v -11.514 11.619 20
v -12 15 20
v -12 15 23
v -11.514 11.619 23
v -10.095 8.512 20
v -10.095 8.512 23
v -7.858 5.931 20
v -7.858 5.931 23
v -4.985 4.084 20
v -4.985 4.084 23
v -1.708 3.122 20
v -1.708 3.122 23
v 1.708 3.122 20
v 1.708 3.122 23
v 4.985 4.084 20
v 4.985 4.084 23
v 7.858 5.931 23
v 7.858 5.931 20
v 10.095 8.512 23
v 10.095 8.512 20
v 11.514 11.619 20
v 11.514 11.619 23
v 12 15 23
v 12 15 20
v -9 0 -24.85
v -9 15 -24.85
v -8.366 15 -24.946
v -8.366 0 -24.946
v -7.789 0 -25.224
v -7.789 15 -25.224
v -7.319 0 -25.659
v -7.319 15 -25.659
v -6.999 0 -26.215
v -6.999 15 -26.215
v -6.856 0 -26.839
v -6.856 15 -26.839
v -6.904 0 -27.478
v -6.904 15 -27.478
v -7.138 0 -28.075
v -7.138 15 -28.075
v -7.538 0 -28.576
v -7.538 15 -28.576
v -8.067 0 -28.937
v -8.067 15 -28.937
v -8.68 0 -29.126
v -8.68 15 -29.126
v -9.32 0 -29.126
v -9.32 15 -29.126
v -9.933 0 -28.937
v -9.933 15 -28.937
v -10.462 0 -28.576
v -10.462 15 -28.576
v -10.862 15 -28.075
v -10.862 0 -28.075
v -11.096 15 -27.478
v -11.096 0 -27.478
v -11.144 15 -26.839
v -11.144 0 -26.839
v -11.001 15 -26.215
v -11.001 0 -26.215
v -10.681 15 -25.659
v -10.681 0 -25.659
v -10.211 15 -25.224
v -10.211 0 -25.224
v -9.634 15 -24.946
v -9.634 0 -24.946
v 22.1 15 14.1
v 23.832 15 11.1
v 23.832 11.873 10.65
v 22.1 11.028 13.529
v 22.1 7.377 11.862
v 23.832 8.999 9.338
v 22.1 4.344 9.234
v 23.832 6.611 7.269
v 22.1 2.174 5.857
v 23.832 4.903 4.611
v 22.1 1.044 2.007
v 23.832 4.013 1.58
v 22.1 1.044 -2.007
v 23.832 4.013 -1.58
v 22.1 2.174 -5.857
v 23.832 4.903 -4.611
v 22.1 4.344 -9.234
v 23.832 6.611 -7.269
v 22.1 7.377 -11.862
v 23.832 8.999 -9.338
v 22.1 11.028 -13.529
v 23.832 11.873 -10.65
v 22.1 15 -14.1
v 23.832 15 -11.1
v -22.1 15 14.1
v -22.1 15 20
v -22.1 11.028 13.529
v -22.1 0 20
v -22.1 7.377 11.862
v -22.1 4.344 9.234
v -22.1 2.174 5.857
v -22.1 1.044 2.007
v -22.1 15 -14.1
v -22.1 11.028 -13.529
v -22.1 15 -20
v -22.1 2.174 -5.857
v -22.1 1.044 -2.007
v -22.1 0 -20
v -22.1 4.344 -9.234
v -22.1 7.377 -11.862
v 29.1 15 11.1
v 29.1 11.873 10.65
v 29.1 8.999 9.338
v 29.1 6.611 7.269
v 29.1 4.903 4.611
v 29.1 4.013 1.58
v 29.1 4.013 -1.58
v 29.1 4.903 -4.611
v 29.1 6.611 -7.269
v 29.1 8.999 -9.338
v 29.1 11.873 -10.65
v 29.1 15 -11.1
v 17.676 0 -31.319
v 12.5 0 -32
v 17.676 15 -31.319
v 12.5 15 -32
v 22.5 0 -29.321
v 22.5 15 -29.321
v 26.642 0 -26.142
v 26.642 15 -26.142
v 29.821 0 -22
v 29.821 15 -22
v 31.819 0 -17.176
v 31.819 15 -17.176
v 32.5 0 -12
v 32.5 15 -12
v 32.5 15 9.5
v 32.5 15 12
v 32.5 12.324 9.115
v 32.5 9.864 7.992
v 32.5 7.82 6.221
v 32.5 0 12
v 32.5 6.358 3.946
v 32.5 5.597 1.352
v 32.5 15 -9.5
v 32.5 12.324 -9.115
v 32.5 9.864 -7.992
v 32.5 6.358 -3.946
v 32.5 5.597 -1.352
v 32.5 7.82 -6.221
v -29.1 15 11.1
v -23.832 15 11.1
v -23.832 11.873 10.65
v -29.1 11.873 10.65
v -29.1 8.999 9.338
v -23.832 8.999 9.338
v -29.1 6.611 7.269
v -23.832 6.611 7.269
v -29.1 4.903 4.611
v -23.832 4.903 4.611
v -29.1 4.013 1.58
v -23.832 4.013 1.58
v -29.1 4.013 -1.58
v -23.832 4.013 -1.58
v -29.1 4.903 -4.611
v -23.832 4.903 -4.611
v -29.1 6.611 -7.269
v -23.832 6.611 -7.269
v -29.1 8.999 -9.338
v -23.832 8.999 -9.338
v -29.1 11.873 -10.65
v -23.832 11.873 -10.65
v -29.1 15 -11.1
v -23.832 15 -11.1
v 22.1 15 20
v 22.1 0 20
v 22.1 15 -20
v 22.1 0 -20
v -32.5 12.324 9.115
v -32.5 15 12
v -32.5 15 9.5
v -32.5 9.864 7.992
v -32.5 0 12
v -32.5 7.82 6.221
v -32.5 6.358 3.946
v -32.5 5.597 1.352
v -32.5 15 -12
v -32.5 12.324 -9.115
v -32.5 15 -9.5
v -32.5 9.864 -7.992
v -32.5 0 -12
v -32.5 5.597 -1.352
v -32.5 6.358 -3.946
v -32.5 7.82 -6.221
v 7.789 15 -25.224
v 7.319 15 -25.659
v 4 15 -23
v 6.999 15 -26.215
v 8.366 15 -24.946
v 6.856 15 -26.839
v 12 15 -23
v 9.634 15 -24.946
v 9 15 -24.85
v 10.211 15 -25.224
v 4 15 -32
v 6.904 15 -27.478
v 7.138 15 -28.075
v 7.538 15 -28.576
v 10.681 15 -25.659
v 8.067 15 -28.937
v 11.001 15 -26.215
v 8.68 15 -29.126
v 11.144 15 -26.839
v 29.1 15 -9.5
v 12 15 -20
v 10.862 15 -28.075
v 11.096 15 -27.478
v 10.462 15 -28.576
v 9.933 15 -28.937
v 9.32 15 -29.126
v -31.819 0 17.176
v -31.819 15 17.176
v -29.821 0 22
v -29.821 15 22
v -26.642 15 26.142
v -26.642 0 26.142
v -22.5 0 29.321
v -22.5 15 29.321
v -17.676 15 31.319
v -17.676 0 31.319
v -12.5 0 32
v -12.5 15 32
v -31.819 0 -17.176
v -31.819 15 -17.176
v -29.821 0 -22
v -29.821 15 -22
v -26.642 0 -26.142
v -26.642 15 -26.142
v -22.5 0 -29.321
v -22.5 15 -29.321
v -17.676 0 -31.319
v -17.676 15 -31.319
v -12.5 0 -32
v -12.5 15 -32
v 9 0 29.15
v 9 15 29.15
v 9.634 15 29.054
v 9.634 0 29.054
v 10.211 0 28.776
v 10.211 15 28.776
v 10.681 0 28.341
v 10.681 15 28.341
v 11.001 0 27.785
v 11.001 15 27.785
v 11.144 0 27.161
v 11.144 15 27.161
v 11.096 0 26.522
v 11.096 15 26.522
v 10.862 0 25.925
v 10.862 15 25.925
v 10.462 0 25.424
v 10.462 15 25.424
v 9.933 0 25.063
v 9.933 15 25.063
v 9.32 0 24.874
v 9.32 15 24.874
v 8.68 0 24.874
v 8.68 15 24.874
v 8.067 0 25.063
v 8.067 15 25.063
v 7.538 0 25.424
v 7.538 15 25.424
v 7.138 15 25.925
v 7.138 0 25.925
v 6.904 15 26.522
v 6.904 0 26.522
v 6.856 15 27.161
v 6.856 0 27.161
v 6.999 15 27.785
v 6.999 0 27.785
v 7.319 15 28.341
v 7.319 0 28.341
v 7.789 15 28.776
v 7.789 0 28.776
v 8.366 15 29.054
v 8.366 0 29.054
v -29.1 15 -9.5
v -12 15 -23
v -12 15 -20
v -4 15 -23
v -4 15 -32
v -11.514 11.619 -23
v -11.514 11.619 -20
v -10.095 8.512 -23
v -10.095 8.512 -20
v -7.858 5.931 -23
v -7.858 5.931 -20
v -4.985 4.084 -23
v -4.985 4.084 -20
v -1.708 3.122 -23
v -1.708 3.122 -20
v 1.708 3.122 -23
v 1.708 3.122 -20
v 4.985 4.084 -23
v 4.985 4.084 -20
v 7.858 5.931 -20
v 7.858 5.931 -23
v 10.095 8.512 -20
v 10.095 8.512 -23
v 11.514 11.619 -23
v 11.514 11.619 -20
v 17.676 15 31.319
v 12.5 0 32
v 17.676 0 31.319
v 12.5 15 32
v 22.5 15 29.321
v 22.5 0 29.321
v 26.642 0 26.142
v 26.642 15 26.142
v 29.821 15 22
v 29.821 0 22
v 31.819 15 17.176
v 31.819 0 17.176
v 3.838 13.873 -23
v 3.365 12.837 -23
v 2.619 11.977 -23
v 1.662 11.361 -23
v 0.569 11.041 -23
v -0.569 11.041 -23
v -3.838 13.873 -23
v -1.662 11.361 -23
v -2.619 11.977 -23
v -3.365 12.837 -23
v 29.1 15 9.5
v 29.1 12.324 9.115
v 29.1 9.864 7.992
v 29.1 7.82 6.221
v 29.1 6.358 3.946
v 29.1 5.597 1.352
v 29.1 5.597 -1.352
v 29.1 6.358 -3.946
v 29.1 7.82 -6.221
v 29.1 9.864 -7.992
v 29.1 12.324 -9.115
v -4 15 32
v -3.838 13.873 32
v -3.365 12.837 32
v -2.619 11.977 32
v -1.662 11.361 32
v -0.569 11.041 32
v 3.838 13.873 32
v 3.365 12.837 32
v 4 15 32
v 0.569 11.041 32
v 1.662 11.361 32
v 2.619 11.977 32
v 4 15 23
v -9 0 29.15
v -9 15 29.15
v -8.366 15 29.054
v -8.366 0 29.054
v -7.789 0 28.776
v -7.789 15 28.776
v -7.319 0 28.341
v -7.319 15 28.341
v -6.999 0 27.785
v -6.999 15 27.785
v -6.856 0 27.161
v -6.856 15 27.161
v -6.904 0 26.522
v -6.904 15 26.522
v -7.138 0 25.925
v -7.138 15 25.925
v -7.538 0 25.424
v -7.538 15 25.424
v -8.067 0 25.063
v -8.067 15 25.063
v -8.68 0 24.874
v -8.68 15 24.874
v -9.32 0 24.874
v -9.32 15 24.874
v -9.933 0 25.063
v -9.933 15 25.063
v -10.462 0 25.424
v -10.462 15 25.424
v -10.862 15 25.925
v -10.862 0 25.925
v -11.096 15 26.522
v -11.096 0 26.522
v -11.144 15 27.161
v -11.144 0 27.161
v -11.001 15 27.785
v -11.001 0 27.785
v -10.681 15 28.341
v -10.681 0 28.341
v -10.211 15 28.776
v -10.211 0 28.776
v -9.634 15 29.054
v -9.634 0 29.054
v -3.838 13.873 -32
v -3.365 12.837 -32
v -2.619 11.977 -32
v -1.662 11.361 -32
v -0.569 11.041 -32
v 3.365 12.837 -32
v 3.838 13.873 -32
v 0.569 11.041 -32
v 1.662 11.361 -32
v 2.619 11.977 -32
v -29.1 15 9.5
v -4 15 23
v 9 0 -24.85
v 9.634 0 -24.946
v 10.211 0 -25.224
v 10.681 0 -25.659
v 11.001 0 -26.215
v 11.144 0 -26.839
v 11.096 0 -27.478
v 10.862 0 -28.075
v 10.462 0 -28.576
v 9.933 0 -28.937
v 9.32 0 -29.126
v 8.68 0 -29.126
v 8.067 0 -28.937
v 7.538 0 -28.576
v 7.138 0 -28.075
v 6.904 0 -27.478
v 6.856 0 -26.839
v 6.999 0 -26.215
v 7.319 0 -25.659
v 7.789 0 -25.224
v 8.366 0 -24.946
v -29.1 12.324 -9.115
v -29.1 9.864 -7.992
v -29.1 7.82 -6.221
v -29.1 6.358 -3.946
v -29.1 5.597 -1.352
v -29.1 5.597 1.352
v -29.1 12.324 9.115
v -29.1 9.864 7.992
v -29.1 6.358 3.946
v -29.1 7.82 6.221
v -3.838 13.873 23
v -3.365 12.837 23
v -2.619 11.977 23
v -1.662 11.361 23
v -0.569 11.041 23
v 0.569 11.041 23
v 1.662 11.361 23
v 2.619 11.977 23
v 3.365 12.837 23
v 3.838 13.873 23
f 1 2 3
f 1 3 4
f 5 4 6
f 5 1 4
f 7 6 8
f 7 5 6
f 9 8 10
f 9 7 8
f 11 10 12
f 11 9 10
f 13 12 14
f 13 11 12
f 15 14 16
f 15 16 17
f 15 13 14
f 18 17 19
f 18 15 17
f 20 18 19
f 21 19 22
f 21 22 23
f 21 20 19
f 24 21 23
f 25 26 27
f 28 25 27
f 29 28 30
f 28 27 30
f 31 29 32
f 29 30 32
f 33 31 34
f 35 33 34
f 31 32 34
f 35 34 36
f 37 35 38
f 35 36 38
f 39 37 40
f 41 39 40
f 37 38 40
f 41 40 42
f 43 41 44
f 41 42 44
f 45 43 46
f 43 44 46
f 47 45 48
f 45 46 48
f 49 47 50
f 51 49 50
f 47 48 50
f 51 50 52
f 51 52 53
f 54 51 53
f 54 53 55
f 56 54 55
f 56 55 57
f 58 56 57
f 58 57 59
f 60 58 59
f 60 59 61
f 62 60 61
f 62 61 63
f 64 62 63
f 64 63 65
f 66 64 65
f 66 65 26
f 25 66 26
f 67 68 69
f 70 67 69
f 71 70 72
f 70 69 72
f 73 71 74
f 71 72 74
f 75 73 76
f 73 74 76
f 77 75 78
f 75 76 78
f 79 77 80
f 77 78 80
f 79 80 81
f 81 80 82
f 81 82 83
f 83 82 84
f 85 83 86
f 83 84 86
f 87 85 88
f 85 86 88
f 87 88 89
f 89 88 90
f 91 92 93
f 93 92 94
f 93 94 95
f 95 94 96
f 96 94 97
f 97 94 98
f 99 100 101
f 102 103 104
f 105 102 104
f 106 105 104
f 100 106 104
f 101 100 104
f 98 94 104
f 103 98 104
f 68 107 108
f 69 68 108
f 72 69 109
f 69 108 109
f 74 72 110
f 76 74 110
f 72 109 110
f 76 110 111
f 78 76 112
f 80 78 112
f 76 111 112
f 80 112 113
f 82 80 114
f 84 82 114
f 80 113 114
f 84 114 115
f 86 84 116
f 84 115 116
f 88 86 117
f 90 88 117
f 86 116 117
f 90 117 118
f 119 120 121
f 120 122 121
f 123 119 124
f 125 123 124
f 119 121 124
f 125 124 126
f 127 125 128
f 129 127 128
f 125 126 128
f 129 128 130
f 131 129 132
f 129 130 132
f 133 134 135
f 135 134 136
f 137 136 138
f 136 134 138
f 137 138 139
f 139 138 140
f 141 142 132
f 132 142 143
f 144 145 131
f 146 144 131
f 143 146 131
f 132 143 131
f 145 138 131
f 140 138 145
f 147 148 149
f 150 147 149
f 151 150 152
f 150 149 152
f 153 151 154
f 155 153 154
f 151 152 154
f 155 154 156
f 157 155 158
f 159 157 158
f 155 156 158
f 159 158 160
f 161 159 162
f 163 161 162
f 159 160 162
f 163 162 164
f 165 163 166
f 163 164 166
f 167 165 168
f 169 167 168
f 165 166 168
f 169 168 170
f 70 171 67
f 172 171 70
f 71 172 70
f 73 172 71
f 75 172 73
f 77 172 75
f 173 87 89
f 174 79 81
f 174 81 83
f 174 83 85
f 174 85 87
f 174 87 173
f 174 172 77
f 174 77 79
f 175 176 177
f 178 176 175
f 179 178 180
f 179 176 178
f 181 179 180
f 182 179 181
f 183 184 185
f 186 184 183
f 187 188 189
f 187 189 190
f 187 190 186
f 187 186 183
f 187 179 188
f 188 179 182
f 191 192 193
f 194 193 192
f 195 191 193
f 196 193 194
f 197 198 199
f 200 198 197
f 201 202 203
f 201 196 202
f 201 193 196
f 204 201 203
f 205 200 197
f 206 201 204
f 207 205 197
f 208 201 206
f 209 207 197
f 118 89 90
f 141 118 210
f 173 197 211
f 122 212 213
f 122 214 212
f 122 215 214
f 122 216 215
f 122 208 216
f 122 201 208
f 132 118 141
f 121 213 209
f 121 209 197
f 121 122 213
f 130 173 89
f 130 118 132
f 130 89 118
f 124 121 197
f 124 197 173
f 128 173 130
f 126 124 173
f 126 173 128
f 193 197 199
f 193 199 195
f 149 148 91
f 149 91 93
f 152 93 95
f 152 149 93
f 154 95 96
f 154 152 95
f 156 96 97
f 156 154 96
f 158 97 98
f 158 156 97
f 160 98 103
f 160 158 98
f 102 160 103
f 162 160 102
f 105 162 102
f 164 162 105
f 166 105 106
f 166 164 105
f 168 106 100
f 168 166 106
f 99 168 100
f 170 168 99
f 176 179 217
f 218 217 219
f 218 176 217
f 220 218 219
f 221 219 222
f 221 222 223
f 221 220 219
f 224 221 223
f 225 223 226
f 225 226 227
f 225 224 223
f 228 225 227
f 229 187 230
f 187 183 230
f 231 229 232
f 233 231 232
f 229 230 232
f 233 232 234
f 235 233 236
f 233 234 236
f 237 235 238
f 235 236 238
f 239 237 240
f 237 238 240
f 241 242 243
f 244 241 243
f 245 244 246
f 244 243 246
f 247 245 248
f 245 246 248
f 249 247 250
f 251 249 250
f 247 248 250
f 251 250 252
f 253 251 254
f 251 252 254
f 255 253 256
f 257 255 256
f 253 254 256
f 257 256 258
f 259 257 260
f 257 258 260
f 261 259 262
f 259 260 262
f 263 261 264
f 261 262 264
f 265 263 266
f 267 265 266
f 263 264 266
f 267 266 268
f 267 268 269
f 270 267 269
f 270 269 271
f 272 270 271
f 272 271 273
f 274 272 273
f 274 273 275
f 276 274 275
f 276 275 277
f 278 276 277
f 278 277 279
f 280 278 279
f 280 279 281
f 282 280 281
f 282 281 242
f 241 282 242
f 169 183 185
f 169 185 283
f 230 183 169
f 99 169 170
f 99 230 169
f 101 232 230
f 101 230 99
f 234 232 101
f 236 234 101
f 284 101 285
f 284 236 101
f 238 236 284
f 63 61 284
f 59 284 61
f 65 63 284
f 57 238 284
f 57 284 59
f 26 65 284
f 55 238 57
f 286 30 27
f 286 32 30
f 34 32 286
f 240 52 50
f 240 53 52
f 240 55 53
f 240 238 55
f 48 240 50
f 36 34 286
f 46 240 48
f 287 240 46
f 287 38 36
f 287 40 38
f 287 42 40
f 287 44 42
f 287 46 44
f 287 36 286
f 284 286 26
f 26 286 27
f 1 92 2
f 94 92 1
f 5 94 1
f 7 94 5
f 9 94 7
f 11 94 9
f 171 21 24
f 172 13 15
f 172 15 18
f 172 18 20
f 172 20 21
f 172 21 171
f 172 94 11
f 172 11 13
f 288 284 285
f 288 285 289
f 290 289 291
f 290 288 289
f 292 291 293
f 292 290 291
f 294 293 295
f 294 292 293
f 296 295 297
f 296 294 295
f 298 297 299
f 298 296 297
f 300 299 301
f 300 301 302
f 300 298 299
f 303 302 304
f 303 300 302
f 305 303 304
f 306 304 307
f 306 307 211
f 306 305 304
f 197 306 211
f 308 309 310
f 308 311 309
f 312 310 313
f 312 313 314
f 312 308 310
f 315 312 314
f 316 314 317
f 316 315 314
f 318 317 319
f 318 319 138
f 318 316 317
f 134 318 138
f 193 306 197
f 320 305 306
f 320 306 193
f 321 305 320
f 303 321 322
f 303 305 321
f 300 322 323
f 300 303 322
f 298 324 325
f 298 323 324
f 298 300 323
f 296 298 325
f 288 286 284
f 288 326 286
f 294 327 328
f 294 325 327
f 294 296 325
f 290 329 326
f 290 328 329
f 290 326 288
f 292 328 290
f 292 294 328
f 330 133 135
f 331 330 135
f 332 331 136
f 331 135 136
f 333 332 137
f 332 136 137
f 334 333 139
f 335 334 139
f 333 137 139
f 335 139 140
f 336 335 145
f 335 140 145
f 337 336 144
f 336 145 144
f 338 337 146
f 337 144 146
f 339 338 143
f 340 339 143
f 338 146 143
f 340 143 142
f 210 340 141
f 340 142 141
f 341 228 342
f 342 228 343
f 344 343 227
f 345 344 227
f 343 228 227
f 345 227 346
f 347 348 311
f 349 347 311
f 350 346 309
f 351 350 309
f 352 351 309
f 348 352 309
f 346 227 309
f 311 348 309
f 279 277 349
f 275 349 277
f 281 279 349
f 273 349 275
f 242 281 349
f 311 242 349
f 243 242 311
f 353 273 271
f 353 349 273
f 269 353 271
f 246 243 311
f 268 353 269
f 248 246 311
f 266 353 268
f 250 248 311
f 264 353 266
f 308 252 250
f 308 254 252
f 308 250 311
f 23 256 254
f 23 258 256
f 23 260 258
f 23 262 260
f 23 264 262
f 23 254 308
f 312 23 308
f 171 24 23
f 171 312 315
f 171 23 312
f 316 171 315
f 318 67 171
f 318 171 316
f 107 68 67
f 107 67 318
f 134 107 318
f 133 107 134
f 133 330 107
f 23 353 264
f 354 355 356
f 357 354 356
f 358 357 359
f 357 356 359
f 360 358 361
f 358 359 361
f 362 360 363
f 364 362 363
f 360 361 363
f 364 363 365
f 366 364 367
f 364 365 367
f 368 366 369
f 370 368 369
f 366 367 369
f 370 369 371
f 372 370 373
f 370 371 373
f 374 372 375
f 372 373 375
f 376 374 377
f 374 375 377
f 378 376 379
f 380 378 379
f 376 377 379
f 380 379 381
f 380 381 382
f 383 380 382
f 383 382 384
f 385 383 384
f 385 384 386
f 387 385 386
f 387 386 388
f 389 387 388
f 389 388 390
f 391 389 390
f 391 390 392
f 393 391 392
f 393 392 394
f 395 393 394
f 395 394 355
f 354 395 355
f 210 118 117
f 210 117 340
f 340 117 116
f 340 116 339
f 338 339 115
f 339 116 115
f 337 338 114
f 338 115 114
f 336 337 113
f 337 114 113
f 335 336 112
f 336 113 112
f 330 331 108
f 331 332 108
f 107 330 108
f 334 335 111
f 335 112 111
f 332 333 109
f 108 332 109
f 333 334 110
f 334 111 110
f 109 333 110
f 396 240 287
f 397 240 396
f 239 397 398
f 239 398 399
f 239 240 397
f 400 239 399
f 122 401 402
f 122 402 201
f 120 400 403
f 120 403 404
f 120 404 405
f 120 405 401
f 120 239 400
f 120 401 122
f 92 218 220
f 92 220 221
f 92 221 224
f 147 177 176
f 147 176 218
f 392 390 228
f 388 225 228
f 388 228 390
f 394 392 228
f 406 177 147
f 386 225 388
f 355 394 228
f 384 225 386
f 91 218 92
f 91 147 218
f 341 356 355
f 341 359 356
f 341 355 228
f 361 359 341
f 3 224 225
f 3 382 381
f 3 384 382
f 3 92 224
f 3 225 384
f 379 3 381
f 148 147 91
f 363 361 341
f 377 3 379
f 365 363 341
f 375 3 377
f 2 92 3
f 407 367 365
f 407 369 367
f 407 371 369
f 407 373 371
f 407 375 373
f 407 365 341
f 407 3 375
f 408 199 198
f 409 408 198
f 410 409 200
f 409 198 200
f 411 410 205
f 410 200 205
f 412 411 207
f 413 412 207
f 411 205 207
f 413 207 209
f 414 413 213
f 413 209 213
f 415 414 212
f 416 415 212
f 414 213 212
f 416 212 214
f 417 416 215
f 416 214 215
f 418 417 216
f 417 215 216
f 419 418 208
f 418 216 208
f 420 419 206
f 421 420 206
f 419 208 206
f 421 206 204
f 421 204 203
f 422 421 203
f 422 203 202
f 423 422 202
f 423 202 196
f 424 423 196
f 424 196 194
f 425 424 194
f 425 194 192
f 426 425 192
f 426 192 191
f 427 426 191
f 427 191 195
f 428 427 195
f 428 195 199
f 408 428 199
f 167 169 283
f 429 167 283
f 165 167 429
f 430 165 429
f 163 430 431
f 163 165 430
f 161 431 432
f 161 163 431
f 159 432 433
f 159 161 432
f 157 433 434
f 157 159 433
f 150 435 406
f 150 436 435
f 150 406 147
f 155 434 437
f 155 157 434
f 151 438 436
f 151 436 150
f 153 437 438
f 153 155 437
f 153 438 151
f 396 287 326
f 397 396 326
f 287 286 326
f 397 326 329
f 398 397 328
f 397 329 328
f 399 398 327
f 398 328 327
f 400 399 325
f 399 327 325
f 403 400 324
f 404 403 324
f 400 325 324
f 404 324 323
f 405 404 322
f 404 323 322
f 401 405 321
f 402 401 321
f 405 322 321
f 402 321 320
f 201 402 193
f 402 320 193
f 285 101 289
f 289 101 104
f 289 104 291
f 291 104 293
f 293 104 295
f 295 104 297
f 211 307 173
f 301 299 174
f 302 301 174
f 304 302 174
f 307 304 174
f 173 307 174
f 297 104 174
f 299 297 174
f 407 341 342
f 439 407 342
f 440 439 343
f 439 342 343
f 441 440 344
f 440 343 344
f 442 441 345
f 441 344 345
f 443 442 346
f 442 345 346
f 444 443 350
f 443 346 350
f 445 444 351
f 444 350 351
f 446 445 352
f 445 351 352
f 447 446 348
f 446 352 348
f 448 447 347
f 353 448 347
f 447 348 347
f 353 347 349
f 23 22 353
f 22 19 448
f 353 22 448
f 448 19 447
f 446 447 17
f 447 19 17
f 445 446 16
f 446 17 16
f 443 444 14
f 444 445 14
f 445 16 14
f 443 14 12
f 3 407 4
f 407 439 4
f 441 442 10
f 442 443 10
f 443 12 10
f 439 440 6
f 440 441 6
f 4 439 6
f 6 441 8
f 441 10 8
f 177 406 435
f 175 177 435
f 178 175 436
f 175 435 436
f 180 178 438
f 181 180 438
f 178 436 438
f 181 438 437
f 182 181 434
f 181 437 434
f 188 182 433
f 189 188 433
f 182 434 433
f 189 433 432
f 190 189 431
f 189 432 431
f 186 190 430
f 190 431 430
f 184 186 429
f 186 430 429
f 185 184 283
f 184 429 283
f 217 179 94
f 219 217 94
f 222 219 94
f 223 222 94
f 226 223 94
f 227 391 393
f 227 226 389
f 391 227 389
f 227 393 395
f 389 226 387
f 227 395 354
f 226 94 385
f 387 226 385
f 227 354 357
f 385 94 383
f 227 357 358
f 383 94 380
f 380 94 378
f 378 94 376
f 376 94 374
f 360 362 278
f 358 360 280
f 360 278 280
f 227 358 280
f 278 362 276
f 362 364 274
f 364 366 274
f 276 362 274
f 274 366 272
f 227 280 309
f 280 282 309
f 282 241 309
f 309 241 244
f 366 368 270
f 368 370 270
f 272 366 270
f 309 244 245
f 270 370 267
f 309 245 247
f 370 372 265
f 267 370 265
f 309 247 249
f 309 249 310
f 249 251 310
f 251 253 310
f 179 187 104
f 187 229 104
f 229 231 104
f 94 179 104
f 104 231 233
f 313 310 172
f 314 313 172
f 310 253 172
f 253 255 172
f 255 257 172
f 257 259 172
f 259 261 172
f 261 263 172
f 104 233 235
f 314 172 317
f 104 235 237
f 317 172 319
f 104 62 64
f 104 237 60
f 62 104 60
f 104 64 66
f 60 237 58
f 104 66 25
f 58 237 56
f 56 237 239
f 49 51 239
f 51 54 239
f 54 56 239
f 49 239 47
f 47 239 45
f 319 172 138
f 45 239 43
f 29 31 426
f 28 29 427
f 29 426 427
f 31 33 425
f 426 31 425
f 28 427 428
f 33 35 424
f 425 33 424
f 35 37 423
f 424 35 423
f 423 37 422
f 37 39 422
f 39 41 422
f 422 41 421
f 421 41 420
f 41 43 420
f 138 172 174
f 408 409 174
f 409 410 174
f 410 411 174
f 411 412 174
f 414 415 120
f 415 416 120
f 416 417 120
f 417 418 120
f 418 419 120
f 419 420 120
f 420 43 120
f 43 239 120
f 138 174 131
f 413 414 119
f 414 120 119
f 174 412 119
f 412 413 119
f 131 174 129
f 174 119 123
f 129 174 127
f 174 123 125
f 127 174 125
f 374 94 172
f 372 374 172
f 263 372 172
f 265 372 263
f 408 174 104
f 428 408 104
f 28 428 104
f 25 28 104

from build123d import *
from OCP.BRepFilletAPI import BRepFilletAPI_MakeChamfer

# Parameters (mm, degrees)
SKETCH1_W           = 65
SKETCH1_H           = 64
SKETCH1_W_2         = 44.2
SKETCH1_H_2         = 40
BOSS_EXTRUDE1_DEPTH = 15
SKETCH3_W           = 7
SKETCH3_H           = 11.1
SKETCH4_R           = 9.5
CUT_EXTRUDE2_DEPTH  = 74.986485252
SKETCH5_R           = 4
CUT_EXTRUDE3_DEPTH  = 74.32973476
SKETCH8_R           = 2.15
CUT_EXTRUDE6_DEPTH  = 49.013019068
FILLET1_R           = 20
CHAMFER1_SIZE       = 3
CHAMFER1_SIZE2      = 1.732050808
SKETCH9_W           = 12
SKETCH9_H           = 3


with BuildPart() as part:
    # Sketch1 → Boss-Extrude1 (new body)
    with BuildSketch(Plane(origin=(0, 0, 0), x_dir=(1, 0, 0), z_dir=(0, 1, 0))):
        Rectangle(SKETCH1_W, SKETCH1_H)
        Rectangle(SKETCH1_W_2, SKETCH1_H_2, mode=Mode.SUBTRACT)
    extrude(amount=BOSS_EXTRUDE1_DEPTH)

    # Sketch3 → Cut-Revolve1 (revolve, cut)
    with BuildSketch(Plane(origin=(0, 15, 0), x_dir=(1, 0, 0), z_dir=(0, 1, 0))):
        with Locations((25.6, -5.55)):
            Rectangle(SKETCH3_W, SKETCH3_H)
        with Locations((-25.6, -5.55)):
            Rectangle(SKETCH3_W, SKETCH3_H)
    revolve(axis=Axis((22.1, 15, 0), (1, 0, 0)), mode=Mode.SUBTRACT)

    # Sketch4 → Cut-Extrude2 (cut, through all)
    with BuildSketch(Plane(origin=(32.5, 0, 0), x_dir=(0, 0, -1), z_dir=(1, 0, 0))):
        with Locations((0, 15)):
            Circle(SKETCH4_R)
    extrude(amount=-CUT_EXTRUDE2_DEPTH, mode=Mode.SUBTRACT)

    # Sketch5 → Cut-Extrude3 (cut, through all)
    with BuildSketch(Plane.XY.offset(32)):
        with Locations((0, 15)):
            Circle(SKETCH5_R)
    extrude(amount=-CUT_EXTRUDE3_DEPTH, mode=Mode.SUBTRACT)

    # Sketch8 → Cut-Extrude6 (cut, through all)
    with BuildSketch(Plane(origin=(0, 15, 0), x_dir=(1, 0, 0), z_dir=(0, 1, 0))):
        with Locations((18, 16.5)):
            Circle(SKETCH8_R)
        with Locations((18, -16.5)):
            Circle(SKETCH8_R)
        with Locations((-18, -16.5)):
            Circle(SKETCH8_R)
        with Locations((-18, 16.5)):
            Circle(SKETCH8_R)
        with Locations(Location((9, -27, 0), (0, 0, 270))):
            Circle(SKETCH8_R)
        with Locations(Location((-9, -27, 0), (0, 0, 270))):
            Circle(SKETCH8_R)
        with Locations(Location((-9, 27, 0), (0, 0, 270))):
            Circle(SKETCH8_R)
        with Locations(Location((9, 27, 0), (0, 0, 270))):
            Circle(SKETCH8_R)
    extrude(amount=-CUT_EXTRUDE6_DEPTH, mode=Mode.SUBTRACT)

    # Fillet1
    fillet1_edges = [part.edges().sort_by_distance(p)[0] for p in [
        (-32.5, 7.5, -32),
        (32.5, 7.5, -32),
        (32.5, 7.5, 32),
        (-32.5, 7.5, 32),
    ]]
    fillet(fillet1_edges, radius=FILLET1_R)

    # Chamfer1: one chamfer whose edges measure the first distance from different faces: ONE call of the kernel's chamfer builder (chamfer() names one face for all edges)
    chamfer1_edges_1 = [part.edges().sort_by_distance(p)[0] for p in [
        (22.1, 3.9, 0),
    ]]
    chamfer1_side_1 = [part.faces().sort_by_distance(p)[0] for p in [
        (22.1, 0.427200187, 0),
    ]]
    chamfer1_edges_2 = [part.edges().sort_by_distance(p)[0] for p in [
        (-22.1, 3.9, 0),
    ]]
    chamfer1_side_2 = [part.faces().sort_by_distance(p)[0] for p in [
        (-22.1, 0.427200187, 0),
    ]]
    chamfer1 = BRepFilletAPI_MakeChamfer(part.part.solid().wrapped)
    for e in chamfer1_edges_1:
        chamfer1.Add(CHAMFER1_SIZE, CHAMFER1_SIZE2, e.wrapped, chamfer1_side_1[0].wrapped)  # the first distance lies on this face
    for e in chamfer1_edges_2:
        chamfer1.Add(CHAMFER1_SIZE, CHAMFER1_SIZE2, e.wrapped, chamfer1_side_2[0].wrapped)  # the first distance lies on this face
    add(Compound.cast(chamfer1.Shape()), mode=Mode.REPLACE)

    # Sketch9 → Cut-Revolve2 (revolve, cut)
    with BuildSketch(Plane(origin=(0, 15, 0), x_dir=(1, 0, 0), z_dir=(0, 1, 0))):
        with Locations((-6, -21.5)):
            Rectangle(SKETCH9_W, SKETCH9_H)
        with Locations((-6, 21.5)):
            Rectangle(SKETCH9_W, SKETCH9_H)
    revolve(axis=Axis((0, 15, -29.871415895), (0, 0, 1)), mode=Mode.SUBTRACT)


solid = part.part
